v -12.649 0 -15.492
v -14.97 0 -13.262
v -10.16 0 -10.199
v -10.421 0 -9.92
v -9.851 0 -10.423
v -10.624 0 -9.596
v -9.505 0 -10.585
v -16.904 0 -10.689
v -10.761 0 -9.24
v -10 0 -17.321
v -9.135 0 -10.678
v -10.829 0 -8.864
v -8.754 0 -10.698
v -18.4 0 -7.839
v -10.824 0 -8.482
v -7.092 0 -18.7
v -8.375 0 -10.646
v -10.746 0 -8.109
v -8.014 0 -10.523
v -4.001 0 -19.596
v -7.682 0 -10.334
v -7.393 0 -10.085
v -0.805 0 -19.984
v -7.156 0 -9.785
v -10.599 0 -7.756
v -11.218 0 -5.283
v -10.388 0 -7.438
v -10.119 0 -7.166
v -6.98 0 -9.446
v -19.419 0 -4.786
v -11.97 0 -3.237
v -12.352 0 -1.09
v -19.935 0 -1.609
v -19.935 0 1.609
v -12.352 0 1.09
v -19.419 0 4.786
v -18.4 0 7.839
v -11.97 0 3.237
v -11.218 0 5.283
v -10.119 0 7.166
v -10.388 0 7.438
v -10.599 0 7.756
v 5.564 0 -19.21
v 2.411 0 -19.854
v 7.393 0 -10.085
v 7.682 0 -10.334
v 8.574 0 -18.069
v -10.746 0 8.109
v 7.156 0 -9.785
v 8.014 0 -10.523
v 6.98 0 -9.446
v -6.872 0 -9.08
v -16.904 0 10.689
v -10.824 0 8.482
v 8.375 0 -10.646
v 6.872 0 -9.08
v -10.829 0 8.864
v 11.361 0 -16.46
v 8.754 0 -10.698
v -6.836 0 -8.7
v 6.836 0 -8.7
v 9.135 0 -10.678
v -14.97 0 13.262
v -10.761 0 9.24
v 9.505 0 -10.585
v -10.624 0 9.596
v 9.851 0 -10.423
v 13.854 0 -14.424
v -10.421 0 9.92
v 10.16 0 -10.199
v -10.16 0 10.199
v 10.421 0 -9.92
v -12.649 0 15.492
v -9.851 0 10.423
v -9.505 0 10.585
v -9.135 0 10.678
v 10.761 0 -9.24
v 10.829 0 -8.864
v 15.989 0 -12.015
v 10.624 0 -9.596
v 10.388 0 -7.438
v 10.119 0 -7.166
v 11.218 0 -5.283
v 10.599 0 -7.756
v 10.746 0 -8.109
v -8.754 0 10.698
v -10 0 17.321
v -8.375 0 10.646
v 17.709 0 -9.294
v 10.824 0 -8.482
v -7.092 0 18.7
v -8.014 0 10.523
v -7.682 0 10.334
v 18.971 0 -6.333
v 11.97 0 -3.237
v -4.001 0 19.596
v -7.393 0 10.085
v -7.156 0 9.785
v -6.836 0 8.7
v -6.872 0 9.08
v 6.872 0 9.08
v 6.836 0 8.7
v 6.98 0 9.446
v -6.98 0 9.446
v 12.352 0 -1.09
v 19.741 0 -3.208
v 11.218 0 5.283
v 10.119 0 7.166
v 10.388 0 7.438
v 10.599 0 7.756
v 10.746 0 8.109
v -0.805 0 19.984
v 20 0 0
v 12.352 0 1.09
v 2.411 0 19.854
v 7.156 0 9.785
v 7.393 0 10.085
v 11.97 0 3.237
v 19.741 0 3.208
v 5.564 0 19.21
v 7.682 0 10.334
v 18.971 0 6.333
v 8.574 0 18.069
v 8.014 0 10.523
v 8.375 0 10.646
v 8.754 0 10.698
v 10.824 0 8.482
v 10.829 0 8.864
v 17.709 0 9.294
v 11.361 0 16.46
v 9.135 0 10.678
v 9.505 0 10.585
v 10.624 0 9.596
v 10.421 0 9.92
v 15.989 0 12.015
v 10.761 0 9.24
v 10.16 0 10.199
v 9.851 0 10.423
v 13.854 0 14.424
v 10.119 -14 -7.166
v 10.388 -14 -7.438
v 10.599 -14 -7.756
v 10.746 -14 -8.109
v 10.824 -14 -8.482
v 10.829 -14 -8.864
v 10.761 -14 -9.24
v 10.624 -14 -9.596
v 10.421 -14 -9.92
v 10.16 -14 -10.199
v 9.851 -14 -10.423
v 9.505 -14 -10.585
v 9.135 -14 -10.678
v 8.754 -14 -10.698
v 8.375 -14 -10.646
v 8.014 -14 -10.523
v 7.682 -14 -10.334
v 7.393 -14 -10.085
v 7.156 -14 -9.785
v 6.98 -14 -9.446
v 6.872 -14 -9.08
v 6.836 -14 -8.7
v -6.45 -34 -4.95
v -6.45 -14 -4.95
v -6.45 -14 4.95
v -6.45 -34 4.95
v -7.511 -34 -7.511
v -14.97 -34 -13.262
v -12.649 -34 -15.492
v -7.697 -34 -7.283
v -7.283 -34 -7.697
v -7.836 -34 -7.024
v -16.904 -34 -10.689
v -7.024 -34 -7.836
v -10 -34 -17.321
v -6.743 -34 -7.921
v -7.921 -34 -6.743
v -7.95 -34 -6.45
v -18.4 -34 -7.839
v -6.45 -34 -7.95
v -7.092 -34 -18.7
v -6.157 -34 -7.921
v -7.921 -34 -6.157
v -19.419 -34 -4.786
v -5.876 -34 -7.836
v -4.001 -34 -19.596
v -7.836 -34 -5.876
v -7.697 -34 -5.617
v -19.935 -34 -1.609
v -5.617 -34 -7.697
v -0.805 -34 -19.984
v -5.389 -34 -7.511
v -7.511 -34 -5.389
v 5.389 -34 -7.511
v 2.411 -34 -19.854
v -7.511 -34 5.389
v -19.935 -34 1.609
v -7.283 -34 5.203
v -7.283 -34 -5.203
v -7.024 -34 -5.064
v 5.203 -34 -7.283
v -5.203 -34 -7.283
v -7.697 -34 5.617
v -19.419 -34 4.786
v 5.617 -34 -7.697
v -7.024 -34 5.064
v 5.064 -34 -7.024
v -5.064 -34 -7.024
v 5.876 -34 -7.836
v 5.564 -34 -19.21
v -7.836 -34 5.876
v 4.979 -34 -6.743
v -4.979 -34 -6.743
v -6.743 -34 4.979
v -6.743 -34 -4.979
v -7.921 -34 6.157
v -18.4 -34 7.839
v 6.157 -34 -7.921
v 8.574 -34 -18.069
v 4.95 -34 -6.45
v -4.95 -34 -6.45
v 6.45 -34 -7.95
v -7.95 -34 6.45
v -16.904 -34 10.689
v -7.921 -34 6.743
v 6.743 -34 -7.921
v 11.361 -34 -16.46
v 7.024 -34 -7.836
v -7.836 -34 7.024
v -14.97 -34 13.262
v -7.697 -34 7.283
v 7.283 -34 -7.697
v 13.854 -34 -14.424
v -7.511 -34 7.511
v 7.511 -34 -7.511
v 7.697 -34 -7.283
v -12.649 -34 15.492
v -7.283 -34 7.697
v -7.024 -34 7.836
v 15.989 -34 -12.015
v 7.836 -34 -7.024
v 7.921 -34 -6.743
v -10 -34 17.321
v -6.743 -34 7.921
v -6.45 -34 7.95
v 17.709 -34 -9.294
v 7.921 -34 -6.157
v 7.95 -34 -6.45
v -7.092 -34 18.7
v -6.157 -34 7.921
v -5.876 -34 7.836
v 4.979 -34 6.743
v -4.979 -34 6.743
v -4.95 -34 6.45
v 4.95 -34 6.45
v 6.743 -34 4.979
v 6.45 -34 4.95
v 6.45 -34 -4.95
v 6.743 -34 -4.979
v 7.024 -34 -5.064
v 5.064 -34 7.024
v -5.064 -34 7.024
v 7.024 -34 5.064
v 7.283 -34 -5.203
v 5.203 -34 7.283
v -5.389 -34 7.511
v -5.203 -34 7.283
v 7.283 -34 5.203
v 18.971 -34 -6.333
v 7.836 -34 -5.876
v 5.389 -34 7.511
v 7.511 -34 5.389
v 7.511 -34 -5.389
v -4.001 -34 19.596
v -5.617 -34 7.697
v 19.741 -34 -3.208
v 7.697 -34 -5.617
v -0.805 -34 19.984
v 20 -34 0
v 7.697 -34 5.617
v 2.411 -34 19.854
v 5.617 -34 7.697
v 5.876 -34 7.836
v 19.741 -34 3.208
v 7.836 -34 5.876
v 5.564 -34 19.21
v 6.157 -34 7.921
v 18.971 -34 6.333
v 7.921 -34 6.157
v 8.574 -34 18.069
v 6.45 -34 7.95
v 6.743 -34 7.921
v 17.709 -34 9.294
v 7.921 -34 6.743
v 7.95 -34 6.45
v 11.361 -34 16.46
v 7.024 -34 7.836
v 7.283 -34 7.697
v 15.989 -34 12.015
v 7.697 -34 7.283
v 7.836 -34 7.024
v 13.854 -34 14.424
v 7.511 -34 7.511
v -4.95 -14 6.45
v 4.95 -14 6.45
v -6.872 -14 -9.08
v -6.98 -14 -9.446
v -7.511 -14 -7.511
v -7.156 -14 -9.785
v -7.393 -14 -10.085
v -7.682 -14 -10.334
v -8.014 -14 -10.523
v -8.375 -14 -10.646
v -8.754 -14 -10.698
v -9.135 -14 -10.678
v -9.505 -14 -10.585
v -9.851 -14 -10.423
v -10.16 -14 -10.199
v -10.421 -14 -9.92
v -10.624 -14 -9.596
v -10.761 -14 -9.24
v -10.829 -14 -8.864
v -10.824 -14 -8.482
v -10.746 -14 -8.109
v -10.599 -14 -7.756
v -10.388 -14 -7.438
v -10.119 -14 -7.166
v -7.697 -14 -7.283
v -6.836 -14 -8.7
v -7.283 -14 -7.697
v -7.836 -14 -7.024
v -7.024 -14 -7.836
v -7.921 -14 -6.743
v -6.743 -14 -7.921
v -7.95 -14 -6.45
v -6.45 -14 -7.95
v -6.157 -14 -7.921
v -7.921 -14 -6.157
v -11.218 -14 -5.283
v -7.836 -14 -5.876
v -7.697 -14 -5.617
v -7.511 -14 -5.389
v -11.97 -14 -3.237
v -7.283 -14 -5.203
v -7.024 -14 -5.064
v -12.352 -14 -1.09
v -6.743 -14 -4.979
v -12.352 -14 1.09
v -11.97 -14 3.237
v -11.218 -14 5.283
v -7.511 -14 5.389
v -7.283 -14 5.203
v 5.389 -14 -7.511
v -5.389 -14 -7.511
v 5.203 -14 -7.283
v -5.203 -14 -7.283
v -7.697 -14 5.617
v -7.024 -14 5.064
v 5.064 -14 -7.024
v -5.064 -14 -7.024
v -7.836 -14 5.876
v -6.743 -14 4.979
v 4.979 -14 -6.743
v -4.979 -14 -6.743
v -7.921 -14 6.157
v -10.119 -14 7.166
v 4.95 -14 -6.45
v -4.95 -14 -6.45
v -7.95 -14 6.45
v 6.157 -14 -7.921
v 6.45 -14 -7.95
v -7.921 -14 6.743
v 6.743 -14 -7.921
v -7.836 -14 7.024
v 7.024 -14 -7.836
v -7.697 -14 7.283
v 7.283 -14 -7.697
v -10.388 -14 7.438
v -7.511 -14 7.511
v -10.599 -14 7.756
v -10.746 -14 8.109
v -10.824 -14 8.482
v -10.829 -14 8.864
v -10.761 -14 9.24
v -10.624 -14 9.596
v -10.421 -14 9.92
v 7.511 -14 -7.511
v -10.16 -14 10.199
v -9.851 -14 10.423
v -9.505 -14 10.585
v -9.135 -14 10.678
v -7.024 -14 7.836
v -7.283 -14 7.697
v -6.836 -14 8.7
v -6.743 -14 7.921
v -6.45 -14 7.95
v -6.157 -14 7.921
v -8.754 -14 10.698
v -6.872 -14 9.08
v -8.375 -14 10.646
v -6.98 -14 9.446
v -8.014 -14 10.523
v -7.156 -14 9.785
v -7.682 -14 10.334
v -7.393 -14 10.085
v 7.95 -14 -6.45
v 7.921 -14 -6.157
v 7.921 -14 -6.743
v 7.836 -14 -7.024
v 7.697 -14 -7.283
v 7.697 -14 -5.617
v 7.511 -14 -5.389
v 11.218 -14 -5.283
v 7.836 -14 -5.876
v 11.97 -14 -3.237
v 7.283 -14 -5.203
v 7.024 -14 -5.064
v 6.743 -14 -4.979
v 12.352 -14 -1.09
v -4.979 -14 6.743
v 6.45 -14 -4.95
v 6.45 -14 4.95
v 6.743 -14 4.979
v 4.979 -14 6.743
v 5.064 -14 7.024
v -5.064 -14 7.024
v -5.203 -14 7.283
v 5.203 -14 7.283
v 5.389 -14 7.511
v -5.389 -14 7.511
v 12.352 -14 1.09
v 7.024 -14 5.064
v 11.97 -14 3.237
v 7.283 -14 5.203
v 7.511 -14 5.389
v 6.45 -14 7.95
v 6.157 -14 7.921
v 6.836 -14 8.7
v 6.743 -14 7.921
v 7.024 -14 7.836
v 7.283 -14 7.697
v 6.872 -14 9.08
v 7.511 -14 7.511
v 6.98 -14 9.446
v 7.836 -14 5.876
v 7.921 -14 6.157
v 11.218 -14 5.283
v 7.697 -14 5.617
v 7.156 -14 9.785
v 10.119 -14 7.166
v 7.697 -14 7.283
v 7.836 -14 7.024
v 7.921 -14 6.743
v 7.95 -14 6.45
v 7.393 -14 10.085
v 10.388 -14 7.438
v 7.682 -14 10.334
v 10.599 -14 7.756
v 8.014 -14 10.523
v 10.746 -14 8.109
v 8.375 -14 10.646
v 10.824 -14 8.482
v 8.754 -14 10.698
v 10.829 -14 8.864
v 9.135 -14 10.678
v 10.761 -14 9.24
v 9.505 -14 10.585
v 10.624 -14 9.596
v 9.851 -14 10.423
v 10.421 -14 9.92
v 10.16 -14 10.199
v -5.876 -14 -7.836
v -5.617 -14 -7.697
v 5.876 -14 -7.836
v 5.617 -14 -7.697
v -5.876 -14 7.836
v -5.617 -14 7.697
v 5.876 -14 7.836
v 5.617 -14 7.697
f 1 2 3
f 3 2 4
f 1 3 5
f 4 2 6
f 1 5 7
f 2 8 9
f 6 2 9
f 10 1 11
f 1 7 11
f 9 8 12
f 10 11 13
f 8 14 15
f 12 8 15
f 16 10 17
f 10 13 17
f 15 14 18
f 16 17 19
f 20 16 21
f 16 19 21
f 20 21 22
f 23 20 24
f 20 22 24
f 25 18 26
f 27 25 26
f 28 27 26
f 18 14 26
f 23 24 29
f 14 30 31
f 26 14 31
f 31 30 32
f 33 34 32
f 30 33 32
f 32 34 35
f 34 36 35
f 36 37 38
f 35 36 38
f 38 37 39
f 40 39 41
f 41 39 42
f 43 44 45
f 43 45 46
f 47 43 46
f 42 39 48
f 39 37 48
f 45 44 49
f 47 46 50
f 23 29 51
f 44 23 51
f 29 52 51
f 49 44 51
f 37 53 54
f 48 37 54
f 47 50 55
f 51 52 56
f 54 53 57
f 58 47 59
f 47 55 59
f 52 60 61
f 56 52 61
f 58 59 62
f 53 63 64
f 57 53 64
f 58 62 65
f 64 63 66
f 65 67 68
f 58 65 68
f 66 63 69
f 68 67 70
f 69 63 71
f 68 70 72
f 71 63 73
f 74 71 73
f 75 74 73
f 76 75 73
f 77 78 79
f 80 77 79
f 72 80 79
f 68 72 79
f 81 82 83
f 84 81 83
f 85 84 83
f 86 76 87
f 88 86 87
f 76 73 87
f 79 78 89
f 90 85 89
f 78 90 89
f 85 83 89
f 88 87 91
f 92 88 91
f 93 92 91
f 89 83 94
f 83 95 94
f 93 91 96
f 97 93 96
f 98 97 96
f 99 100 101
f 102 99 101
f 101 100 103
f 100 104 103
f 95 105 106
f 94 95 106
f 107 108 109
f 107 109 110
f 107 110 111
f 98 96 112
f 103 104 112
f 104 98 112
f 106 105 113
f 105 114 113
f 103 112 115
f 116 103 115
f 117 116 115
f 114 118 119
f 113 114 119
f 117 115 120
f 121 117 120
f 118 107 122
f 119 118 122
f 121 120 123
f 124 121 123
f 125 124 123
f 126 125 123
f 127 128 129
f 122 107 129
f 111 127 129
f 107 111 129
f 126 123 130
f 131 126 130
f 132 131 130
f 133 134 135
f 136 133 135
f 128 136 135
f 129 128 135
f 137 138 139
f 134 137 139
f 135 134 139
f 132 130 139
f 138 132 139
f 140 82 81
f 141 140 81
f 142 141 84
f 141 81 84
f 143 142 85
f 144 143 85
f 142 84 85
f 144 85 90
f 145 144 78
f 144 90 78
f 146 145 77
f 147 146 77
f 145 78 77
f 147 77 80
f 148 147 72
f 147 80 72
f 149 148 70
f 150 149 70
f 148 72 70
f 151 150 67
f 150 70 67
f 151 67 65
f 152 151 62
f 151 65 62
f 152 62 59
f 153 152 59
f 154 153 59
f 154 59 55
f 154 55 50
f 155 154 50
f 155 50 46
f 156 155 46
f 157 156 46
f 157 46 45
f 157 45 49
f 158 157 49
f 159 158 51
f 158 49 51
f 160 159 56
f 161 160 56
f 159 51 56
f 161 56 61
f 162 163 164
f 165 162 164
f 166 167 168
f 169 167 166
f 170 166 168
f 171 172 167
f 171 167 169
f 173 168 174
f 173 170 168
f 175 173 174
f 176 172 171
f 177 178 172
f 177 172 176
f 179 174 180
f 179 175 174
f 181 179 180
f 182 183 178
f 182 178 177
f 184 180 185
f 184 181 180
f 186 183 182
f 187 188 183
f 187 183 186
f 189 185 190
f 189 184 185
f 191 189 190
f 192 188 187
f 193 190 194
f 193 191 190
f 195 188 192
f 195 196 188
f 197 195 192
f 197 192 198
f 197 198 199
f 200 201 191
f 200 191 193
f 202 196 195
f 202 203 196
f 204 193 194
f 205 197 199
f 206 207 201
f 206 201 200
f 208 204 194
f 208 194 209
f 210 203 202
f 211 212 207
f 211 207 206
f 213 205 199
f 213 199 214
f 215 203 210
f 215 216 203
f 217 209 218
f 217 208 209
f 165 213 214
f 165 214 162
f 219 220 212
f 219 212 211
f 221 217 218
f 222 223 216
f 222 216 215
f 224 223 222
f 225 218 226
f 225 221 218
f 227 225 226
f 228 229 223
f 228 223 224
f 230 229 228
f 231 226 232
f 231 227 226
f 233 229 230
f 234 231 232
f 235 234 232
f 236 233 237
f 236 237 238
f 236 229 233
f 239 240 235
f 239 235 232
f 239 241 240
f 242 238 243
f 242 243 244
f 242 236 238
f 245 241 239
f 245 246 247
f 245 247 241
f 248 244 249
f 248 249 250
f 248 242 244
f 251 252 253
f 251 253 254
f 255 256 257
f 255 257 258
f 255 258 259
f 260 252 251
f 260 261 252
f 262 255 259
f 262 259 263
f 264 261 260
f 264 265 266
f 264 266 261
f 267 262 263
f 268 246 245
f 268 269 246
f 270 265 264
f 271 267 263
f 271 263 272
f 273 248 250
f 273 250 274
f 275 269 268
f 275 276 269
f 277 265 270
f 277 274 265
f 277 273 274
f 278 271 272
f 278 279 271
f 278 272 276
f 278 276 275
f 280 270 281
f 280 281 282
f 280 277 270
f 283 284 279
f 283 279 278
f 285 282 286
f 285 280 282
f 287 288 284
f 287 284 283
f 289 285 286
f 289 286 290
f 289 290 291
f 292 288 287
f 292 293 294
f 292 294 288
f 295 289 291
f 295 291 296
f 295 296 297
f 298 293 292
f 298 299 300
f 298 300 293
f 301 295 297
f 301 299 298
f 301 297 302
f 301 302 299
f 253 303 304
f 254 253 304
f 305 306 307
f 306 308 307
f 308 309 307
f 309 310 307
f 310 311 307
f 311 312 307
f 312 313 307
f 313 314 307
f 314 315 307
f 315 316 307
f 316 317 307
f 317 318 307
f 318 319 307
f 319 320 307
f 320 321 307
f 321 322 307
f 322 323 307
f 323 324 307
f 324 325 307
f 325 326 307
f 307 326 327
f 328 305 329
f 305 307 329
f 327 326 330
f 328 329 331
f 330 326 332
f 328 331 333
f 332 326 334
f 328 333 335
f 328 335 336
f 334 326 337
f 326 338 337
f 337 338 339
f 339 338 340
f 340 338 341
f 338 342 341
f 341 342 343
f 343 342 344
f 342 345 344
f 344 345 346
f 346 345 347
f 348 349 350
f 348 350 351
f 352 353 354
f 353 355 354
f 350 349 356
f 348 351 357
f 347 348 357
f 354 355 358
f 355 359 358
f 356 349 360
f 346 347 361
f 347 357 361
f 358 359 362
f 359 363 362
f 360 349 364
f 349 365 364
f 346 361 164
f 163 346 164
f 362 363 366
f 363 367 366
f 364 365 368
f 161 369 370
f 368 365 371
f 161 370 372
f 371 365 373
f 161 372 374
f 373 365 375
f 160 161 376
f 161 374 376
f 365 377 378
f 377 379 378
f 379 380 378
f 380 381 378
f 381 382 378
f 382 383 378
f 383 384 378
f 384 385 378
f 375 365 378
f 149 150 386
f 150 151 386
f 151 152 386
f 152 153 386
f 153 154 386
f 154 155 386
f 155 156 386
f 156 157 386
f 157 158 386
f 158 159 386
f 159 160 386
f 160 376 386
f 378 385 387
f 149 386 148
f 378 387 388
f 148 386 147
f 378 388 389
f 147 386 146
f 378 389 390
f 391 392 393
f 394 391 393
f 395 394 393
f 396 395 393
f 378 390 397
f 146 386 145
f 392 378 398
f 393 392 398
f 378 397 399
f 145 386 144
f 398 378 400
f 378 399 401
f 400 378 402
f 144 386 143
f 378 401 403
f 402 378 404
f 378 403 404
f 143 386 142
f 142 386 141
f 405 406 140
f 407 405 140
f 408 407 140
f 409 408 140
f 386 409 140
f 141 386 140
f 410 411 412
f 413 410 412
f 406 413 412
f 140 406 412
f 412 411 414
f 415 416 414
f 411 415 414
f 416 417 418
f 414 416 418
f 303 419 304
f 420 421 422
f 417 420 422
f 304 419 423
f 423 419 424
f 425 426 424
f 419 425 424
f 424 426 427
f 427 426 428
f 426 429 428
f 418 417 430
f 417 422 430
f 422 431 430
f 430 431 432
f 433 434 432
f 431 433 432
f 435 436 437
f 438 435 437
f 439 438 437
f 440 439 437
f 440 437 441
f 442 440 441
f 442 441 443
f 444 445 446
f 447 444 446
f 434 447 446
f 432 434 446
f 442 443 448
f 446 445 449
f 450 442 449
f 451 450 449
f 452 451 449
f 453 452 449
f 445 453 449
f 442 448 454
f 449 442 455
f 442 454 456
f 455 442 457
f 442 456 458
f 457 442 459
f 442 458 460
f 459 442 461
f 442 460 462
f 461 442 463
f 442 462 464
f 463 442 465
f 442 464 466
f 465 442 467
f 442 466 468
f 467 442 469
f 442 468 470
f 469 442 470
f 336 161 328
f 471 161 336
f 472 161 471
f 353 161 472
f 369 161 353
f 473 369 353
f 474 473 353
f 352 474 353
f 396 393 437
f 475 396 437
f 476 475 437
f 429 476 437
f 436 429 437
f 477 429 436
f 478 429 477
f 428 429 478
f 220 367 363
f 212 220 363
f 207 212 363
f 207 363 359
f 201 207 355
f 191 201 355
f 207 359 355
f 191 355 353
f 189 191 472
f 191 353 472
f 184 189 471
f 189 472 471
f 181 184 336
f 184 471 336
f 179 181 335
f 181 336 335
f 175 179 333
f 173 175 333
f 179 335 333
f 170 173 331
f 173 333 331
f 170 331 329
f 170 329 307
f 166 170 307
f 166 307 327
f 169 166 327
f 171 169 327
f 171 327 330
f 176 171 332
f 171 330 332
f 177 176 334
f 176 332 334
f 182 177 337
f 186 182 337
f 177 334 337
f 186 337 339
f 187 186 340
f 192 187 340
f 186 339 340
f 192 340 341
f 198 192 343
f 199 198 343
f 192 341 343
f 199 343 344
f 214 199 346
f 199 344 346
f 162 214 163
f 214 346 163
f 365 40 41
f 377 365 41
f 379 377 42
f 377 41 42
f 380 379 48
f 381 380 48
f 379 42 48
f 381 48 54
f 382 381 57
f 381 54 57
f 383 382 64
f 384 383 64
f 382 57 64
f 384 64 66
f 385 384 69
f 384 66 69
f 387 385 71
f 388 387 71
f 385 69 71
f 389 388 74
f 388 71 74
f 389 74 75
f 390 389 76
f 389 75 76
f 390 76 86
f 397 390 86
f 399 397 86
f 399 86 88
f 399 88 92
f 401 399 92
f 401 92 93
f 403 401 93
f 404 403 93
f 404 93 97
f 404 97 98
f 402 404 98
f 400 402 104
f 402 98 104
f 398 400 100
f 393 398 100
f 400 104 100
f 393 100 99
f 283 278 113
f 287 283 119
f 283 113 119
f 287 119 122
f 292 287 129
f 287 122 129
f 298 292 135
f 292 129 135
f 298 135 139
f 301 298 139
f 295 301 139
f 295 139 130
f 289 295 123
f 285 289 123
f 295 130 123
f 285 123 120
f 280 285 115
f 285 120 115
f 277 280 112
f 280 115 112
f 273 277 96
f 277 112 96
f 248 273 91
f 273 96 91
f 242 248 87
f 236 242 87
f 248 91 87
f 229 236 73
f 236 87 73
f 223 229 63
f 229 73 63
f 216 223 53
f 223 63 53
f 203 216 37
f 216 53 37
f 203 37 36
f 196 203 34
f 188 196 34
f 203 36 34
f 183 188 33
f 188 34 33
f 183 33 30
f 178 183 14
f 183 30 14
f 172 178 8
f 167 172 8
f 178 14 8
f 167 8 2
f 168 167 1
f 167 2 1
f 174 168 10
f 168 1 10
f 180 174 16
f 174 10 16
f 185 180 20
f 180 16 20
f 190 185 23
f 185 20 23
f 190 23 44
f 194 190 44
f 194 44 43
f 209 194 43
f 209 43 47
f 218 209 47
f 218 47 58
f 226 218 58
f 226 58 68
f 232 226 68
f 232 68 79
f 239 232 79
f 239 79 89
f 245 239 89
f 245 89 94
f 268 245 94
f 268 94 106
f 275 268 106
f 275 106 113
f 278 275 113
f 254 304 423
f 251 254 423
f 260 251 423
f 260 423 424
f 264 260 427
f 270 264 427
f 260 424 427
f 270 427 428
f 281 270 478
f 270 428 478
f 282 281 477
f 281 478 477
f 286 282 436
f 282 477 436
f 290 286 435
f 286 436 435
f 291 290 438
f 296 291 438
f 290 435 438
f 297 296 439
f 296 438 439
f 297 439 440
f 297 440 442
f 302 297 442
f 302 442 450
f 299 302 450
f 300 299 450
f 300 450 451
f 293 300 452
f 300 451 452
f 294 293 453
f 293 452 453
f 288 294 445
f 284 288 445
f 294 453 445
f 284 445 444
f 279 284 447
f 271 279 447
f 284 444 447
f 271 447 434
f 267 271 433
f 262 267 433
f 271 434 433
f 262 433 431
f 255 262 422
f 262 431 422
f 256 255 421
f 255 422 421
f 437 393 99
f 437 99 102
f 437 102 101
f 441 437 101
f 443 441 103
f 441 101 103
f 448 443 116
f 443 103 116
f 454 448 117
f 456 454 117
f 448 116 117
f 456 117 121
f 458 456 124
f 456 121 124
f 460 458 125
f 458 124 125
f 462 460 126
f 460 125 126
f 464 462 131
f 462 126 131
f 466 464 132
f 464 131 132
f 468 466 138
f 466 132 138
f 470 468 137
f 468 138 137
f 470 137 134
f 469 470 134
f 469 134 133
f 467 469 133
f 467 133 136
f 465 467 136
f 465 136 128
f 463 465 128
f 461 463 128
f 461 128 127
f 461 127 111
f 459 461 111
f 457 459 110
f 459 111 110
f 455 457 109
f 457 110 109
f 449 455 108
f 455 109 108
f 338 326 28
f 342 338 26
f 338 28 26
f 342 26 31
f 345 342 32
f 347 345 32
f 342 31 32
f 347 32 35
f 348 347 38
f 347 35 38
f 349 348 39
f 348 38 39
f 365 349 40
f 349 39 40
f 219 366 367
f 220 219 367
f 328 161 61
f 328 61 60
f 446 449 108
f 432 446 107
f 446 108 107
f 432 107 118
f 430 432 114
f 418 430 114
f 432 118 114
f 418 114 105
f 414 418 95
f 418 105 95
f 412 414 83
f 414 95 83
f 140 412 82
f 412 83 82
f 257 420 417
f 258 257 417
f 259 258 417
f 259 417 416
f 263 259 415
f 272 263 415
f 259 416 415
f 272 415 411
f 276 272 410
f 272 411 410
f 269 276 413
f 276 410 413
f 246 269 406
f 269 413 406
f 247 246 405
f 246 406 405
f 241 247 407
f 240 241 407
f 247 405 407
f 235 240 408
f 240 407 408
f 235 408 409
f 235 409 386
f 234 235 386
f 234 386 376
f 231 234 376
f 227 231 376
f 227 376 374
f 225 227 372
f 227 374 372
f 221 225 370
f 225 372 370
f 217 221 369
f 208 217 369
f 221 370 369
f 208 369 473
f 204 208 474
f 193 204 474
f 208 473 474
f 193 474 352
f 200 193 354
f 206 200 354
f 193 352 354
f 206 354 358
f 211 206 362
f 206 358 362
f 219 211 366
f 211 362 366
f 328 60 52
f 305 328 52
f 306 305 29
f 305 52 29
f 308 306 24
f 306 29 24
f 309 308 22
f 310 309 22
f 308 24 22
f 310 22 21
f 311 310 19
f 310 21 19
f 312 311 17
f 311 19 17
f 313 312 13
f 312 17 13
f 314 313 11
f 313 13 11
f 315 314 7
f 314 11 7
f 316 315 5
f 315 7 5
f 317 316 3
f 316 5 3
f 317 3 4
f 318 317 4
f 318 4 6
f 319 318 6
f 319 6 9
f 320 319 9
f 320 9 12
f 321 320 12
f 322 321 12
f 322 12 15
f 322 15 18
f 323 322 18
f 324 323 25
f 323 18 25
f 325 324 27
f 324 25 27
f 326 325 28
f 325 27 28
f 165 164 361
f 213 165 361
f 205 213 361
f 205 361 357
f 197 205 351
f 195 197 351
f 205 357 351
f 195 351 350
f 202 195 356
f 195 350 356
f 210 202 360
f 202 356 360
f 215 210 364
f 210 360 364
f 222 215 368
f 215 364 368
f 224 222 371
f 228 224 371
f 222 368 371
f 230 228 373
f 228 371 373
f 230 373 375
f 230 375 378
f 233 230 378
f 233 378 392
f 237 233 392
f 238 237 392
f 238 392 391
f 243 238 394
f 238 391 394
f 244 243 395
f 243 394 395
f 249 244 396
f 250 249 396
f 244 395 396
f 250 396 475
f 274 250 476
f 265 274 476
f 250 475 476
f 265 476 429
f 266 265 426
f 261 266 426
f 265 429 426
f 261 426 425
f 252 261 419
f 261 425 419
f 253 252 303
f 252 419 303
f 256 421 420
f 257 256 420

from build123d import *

# Parameters (mm, degrees)
F0_R     = 20
F1_DEPTH = 14
F2_R     = 20
F3_DEPTH = 20


with BuildPart() as f1:
    # F0 (on Front) → F1 (new body)
    with BuildSketch(Plane.XZ):
        Circle(F0_R)
        with BuildLine():
            ThreePointArc((-10.11945, -7.166362), (-12.4, 0), (-10.11945, 7.166362))
            ThreePointArc((-10.11945, 7.166362), (-9.682052, 10.512106), (-6.835723, 8.7))
            Line((-6.835723, 8.7), (6.835723, 8.7))
            ThreePointArc((6.835723, 8.7), (9.682052, 10.512106), (10.11945, 7.166362))
            ThreePointArc((10.11945, 7.166362), (12.4, 0), (10.11945, -7.166362))
            ThreePointArc((10.11945, -7.166362), (9.682052, -10.512106), (6.835723, -8.7))
            Line((6.835723, -8.7), (-6.835723, -8.7))
            ThreePointArc((-6.835723, -8.7), (-9.682052, -10.512106), (-10.11945, -7.166362))
        make_face(mode=Mode.SUBTRACT)
    extrude(amount=F1_DEPTH)

    # F2 (on face) → F3 (join)
    with BuildSketch(Plane.XZ.offset(14)):
        Circle(F2_R)
        with BuildLine():
            ThreePointArc((-6.45, 4.95), (-7.51066, 7.51066), (-4.95, 6.45))
            Line((-4.95, 6.45), (4.95, 6.45))
            ThreePointArc((4.95, 6.45), (7.51066, 7.51066), (6.45, 4.95))
            Line((6.45, 4.95), (6.45, -4.95))
            ThreePointArc((6.45, -4.95), (7.51066, -7.51066), (4.95, -6.45))
            Line((4.95, -6.45), (-4.95, -6.45))
            ThreePointArc((-4.95, -6.45), (-7.51066, -7.51066), (-6.45, -4.95))
            Line((-6.45, -4.95), (-6.45, 4.95))
        make_face(mode=Mode.SUBTRACT)
    extrude(amount=F3_DEPTH)


solid = f1.part
